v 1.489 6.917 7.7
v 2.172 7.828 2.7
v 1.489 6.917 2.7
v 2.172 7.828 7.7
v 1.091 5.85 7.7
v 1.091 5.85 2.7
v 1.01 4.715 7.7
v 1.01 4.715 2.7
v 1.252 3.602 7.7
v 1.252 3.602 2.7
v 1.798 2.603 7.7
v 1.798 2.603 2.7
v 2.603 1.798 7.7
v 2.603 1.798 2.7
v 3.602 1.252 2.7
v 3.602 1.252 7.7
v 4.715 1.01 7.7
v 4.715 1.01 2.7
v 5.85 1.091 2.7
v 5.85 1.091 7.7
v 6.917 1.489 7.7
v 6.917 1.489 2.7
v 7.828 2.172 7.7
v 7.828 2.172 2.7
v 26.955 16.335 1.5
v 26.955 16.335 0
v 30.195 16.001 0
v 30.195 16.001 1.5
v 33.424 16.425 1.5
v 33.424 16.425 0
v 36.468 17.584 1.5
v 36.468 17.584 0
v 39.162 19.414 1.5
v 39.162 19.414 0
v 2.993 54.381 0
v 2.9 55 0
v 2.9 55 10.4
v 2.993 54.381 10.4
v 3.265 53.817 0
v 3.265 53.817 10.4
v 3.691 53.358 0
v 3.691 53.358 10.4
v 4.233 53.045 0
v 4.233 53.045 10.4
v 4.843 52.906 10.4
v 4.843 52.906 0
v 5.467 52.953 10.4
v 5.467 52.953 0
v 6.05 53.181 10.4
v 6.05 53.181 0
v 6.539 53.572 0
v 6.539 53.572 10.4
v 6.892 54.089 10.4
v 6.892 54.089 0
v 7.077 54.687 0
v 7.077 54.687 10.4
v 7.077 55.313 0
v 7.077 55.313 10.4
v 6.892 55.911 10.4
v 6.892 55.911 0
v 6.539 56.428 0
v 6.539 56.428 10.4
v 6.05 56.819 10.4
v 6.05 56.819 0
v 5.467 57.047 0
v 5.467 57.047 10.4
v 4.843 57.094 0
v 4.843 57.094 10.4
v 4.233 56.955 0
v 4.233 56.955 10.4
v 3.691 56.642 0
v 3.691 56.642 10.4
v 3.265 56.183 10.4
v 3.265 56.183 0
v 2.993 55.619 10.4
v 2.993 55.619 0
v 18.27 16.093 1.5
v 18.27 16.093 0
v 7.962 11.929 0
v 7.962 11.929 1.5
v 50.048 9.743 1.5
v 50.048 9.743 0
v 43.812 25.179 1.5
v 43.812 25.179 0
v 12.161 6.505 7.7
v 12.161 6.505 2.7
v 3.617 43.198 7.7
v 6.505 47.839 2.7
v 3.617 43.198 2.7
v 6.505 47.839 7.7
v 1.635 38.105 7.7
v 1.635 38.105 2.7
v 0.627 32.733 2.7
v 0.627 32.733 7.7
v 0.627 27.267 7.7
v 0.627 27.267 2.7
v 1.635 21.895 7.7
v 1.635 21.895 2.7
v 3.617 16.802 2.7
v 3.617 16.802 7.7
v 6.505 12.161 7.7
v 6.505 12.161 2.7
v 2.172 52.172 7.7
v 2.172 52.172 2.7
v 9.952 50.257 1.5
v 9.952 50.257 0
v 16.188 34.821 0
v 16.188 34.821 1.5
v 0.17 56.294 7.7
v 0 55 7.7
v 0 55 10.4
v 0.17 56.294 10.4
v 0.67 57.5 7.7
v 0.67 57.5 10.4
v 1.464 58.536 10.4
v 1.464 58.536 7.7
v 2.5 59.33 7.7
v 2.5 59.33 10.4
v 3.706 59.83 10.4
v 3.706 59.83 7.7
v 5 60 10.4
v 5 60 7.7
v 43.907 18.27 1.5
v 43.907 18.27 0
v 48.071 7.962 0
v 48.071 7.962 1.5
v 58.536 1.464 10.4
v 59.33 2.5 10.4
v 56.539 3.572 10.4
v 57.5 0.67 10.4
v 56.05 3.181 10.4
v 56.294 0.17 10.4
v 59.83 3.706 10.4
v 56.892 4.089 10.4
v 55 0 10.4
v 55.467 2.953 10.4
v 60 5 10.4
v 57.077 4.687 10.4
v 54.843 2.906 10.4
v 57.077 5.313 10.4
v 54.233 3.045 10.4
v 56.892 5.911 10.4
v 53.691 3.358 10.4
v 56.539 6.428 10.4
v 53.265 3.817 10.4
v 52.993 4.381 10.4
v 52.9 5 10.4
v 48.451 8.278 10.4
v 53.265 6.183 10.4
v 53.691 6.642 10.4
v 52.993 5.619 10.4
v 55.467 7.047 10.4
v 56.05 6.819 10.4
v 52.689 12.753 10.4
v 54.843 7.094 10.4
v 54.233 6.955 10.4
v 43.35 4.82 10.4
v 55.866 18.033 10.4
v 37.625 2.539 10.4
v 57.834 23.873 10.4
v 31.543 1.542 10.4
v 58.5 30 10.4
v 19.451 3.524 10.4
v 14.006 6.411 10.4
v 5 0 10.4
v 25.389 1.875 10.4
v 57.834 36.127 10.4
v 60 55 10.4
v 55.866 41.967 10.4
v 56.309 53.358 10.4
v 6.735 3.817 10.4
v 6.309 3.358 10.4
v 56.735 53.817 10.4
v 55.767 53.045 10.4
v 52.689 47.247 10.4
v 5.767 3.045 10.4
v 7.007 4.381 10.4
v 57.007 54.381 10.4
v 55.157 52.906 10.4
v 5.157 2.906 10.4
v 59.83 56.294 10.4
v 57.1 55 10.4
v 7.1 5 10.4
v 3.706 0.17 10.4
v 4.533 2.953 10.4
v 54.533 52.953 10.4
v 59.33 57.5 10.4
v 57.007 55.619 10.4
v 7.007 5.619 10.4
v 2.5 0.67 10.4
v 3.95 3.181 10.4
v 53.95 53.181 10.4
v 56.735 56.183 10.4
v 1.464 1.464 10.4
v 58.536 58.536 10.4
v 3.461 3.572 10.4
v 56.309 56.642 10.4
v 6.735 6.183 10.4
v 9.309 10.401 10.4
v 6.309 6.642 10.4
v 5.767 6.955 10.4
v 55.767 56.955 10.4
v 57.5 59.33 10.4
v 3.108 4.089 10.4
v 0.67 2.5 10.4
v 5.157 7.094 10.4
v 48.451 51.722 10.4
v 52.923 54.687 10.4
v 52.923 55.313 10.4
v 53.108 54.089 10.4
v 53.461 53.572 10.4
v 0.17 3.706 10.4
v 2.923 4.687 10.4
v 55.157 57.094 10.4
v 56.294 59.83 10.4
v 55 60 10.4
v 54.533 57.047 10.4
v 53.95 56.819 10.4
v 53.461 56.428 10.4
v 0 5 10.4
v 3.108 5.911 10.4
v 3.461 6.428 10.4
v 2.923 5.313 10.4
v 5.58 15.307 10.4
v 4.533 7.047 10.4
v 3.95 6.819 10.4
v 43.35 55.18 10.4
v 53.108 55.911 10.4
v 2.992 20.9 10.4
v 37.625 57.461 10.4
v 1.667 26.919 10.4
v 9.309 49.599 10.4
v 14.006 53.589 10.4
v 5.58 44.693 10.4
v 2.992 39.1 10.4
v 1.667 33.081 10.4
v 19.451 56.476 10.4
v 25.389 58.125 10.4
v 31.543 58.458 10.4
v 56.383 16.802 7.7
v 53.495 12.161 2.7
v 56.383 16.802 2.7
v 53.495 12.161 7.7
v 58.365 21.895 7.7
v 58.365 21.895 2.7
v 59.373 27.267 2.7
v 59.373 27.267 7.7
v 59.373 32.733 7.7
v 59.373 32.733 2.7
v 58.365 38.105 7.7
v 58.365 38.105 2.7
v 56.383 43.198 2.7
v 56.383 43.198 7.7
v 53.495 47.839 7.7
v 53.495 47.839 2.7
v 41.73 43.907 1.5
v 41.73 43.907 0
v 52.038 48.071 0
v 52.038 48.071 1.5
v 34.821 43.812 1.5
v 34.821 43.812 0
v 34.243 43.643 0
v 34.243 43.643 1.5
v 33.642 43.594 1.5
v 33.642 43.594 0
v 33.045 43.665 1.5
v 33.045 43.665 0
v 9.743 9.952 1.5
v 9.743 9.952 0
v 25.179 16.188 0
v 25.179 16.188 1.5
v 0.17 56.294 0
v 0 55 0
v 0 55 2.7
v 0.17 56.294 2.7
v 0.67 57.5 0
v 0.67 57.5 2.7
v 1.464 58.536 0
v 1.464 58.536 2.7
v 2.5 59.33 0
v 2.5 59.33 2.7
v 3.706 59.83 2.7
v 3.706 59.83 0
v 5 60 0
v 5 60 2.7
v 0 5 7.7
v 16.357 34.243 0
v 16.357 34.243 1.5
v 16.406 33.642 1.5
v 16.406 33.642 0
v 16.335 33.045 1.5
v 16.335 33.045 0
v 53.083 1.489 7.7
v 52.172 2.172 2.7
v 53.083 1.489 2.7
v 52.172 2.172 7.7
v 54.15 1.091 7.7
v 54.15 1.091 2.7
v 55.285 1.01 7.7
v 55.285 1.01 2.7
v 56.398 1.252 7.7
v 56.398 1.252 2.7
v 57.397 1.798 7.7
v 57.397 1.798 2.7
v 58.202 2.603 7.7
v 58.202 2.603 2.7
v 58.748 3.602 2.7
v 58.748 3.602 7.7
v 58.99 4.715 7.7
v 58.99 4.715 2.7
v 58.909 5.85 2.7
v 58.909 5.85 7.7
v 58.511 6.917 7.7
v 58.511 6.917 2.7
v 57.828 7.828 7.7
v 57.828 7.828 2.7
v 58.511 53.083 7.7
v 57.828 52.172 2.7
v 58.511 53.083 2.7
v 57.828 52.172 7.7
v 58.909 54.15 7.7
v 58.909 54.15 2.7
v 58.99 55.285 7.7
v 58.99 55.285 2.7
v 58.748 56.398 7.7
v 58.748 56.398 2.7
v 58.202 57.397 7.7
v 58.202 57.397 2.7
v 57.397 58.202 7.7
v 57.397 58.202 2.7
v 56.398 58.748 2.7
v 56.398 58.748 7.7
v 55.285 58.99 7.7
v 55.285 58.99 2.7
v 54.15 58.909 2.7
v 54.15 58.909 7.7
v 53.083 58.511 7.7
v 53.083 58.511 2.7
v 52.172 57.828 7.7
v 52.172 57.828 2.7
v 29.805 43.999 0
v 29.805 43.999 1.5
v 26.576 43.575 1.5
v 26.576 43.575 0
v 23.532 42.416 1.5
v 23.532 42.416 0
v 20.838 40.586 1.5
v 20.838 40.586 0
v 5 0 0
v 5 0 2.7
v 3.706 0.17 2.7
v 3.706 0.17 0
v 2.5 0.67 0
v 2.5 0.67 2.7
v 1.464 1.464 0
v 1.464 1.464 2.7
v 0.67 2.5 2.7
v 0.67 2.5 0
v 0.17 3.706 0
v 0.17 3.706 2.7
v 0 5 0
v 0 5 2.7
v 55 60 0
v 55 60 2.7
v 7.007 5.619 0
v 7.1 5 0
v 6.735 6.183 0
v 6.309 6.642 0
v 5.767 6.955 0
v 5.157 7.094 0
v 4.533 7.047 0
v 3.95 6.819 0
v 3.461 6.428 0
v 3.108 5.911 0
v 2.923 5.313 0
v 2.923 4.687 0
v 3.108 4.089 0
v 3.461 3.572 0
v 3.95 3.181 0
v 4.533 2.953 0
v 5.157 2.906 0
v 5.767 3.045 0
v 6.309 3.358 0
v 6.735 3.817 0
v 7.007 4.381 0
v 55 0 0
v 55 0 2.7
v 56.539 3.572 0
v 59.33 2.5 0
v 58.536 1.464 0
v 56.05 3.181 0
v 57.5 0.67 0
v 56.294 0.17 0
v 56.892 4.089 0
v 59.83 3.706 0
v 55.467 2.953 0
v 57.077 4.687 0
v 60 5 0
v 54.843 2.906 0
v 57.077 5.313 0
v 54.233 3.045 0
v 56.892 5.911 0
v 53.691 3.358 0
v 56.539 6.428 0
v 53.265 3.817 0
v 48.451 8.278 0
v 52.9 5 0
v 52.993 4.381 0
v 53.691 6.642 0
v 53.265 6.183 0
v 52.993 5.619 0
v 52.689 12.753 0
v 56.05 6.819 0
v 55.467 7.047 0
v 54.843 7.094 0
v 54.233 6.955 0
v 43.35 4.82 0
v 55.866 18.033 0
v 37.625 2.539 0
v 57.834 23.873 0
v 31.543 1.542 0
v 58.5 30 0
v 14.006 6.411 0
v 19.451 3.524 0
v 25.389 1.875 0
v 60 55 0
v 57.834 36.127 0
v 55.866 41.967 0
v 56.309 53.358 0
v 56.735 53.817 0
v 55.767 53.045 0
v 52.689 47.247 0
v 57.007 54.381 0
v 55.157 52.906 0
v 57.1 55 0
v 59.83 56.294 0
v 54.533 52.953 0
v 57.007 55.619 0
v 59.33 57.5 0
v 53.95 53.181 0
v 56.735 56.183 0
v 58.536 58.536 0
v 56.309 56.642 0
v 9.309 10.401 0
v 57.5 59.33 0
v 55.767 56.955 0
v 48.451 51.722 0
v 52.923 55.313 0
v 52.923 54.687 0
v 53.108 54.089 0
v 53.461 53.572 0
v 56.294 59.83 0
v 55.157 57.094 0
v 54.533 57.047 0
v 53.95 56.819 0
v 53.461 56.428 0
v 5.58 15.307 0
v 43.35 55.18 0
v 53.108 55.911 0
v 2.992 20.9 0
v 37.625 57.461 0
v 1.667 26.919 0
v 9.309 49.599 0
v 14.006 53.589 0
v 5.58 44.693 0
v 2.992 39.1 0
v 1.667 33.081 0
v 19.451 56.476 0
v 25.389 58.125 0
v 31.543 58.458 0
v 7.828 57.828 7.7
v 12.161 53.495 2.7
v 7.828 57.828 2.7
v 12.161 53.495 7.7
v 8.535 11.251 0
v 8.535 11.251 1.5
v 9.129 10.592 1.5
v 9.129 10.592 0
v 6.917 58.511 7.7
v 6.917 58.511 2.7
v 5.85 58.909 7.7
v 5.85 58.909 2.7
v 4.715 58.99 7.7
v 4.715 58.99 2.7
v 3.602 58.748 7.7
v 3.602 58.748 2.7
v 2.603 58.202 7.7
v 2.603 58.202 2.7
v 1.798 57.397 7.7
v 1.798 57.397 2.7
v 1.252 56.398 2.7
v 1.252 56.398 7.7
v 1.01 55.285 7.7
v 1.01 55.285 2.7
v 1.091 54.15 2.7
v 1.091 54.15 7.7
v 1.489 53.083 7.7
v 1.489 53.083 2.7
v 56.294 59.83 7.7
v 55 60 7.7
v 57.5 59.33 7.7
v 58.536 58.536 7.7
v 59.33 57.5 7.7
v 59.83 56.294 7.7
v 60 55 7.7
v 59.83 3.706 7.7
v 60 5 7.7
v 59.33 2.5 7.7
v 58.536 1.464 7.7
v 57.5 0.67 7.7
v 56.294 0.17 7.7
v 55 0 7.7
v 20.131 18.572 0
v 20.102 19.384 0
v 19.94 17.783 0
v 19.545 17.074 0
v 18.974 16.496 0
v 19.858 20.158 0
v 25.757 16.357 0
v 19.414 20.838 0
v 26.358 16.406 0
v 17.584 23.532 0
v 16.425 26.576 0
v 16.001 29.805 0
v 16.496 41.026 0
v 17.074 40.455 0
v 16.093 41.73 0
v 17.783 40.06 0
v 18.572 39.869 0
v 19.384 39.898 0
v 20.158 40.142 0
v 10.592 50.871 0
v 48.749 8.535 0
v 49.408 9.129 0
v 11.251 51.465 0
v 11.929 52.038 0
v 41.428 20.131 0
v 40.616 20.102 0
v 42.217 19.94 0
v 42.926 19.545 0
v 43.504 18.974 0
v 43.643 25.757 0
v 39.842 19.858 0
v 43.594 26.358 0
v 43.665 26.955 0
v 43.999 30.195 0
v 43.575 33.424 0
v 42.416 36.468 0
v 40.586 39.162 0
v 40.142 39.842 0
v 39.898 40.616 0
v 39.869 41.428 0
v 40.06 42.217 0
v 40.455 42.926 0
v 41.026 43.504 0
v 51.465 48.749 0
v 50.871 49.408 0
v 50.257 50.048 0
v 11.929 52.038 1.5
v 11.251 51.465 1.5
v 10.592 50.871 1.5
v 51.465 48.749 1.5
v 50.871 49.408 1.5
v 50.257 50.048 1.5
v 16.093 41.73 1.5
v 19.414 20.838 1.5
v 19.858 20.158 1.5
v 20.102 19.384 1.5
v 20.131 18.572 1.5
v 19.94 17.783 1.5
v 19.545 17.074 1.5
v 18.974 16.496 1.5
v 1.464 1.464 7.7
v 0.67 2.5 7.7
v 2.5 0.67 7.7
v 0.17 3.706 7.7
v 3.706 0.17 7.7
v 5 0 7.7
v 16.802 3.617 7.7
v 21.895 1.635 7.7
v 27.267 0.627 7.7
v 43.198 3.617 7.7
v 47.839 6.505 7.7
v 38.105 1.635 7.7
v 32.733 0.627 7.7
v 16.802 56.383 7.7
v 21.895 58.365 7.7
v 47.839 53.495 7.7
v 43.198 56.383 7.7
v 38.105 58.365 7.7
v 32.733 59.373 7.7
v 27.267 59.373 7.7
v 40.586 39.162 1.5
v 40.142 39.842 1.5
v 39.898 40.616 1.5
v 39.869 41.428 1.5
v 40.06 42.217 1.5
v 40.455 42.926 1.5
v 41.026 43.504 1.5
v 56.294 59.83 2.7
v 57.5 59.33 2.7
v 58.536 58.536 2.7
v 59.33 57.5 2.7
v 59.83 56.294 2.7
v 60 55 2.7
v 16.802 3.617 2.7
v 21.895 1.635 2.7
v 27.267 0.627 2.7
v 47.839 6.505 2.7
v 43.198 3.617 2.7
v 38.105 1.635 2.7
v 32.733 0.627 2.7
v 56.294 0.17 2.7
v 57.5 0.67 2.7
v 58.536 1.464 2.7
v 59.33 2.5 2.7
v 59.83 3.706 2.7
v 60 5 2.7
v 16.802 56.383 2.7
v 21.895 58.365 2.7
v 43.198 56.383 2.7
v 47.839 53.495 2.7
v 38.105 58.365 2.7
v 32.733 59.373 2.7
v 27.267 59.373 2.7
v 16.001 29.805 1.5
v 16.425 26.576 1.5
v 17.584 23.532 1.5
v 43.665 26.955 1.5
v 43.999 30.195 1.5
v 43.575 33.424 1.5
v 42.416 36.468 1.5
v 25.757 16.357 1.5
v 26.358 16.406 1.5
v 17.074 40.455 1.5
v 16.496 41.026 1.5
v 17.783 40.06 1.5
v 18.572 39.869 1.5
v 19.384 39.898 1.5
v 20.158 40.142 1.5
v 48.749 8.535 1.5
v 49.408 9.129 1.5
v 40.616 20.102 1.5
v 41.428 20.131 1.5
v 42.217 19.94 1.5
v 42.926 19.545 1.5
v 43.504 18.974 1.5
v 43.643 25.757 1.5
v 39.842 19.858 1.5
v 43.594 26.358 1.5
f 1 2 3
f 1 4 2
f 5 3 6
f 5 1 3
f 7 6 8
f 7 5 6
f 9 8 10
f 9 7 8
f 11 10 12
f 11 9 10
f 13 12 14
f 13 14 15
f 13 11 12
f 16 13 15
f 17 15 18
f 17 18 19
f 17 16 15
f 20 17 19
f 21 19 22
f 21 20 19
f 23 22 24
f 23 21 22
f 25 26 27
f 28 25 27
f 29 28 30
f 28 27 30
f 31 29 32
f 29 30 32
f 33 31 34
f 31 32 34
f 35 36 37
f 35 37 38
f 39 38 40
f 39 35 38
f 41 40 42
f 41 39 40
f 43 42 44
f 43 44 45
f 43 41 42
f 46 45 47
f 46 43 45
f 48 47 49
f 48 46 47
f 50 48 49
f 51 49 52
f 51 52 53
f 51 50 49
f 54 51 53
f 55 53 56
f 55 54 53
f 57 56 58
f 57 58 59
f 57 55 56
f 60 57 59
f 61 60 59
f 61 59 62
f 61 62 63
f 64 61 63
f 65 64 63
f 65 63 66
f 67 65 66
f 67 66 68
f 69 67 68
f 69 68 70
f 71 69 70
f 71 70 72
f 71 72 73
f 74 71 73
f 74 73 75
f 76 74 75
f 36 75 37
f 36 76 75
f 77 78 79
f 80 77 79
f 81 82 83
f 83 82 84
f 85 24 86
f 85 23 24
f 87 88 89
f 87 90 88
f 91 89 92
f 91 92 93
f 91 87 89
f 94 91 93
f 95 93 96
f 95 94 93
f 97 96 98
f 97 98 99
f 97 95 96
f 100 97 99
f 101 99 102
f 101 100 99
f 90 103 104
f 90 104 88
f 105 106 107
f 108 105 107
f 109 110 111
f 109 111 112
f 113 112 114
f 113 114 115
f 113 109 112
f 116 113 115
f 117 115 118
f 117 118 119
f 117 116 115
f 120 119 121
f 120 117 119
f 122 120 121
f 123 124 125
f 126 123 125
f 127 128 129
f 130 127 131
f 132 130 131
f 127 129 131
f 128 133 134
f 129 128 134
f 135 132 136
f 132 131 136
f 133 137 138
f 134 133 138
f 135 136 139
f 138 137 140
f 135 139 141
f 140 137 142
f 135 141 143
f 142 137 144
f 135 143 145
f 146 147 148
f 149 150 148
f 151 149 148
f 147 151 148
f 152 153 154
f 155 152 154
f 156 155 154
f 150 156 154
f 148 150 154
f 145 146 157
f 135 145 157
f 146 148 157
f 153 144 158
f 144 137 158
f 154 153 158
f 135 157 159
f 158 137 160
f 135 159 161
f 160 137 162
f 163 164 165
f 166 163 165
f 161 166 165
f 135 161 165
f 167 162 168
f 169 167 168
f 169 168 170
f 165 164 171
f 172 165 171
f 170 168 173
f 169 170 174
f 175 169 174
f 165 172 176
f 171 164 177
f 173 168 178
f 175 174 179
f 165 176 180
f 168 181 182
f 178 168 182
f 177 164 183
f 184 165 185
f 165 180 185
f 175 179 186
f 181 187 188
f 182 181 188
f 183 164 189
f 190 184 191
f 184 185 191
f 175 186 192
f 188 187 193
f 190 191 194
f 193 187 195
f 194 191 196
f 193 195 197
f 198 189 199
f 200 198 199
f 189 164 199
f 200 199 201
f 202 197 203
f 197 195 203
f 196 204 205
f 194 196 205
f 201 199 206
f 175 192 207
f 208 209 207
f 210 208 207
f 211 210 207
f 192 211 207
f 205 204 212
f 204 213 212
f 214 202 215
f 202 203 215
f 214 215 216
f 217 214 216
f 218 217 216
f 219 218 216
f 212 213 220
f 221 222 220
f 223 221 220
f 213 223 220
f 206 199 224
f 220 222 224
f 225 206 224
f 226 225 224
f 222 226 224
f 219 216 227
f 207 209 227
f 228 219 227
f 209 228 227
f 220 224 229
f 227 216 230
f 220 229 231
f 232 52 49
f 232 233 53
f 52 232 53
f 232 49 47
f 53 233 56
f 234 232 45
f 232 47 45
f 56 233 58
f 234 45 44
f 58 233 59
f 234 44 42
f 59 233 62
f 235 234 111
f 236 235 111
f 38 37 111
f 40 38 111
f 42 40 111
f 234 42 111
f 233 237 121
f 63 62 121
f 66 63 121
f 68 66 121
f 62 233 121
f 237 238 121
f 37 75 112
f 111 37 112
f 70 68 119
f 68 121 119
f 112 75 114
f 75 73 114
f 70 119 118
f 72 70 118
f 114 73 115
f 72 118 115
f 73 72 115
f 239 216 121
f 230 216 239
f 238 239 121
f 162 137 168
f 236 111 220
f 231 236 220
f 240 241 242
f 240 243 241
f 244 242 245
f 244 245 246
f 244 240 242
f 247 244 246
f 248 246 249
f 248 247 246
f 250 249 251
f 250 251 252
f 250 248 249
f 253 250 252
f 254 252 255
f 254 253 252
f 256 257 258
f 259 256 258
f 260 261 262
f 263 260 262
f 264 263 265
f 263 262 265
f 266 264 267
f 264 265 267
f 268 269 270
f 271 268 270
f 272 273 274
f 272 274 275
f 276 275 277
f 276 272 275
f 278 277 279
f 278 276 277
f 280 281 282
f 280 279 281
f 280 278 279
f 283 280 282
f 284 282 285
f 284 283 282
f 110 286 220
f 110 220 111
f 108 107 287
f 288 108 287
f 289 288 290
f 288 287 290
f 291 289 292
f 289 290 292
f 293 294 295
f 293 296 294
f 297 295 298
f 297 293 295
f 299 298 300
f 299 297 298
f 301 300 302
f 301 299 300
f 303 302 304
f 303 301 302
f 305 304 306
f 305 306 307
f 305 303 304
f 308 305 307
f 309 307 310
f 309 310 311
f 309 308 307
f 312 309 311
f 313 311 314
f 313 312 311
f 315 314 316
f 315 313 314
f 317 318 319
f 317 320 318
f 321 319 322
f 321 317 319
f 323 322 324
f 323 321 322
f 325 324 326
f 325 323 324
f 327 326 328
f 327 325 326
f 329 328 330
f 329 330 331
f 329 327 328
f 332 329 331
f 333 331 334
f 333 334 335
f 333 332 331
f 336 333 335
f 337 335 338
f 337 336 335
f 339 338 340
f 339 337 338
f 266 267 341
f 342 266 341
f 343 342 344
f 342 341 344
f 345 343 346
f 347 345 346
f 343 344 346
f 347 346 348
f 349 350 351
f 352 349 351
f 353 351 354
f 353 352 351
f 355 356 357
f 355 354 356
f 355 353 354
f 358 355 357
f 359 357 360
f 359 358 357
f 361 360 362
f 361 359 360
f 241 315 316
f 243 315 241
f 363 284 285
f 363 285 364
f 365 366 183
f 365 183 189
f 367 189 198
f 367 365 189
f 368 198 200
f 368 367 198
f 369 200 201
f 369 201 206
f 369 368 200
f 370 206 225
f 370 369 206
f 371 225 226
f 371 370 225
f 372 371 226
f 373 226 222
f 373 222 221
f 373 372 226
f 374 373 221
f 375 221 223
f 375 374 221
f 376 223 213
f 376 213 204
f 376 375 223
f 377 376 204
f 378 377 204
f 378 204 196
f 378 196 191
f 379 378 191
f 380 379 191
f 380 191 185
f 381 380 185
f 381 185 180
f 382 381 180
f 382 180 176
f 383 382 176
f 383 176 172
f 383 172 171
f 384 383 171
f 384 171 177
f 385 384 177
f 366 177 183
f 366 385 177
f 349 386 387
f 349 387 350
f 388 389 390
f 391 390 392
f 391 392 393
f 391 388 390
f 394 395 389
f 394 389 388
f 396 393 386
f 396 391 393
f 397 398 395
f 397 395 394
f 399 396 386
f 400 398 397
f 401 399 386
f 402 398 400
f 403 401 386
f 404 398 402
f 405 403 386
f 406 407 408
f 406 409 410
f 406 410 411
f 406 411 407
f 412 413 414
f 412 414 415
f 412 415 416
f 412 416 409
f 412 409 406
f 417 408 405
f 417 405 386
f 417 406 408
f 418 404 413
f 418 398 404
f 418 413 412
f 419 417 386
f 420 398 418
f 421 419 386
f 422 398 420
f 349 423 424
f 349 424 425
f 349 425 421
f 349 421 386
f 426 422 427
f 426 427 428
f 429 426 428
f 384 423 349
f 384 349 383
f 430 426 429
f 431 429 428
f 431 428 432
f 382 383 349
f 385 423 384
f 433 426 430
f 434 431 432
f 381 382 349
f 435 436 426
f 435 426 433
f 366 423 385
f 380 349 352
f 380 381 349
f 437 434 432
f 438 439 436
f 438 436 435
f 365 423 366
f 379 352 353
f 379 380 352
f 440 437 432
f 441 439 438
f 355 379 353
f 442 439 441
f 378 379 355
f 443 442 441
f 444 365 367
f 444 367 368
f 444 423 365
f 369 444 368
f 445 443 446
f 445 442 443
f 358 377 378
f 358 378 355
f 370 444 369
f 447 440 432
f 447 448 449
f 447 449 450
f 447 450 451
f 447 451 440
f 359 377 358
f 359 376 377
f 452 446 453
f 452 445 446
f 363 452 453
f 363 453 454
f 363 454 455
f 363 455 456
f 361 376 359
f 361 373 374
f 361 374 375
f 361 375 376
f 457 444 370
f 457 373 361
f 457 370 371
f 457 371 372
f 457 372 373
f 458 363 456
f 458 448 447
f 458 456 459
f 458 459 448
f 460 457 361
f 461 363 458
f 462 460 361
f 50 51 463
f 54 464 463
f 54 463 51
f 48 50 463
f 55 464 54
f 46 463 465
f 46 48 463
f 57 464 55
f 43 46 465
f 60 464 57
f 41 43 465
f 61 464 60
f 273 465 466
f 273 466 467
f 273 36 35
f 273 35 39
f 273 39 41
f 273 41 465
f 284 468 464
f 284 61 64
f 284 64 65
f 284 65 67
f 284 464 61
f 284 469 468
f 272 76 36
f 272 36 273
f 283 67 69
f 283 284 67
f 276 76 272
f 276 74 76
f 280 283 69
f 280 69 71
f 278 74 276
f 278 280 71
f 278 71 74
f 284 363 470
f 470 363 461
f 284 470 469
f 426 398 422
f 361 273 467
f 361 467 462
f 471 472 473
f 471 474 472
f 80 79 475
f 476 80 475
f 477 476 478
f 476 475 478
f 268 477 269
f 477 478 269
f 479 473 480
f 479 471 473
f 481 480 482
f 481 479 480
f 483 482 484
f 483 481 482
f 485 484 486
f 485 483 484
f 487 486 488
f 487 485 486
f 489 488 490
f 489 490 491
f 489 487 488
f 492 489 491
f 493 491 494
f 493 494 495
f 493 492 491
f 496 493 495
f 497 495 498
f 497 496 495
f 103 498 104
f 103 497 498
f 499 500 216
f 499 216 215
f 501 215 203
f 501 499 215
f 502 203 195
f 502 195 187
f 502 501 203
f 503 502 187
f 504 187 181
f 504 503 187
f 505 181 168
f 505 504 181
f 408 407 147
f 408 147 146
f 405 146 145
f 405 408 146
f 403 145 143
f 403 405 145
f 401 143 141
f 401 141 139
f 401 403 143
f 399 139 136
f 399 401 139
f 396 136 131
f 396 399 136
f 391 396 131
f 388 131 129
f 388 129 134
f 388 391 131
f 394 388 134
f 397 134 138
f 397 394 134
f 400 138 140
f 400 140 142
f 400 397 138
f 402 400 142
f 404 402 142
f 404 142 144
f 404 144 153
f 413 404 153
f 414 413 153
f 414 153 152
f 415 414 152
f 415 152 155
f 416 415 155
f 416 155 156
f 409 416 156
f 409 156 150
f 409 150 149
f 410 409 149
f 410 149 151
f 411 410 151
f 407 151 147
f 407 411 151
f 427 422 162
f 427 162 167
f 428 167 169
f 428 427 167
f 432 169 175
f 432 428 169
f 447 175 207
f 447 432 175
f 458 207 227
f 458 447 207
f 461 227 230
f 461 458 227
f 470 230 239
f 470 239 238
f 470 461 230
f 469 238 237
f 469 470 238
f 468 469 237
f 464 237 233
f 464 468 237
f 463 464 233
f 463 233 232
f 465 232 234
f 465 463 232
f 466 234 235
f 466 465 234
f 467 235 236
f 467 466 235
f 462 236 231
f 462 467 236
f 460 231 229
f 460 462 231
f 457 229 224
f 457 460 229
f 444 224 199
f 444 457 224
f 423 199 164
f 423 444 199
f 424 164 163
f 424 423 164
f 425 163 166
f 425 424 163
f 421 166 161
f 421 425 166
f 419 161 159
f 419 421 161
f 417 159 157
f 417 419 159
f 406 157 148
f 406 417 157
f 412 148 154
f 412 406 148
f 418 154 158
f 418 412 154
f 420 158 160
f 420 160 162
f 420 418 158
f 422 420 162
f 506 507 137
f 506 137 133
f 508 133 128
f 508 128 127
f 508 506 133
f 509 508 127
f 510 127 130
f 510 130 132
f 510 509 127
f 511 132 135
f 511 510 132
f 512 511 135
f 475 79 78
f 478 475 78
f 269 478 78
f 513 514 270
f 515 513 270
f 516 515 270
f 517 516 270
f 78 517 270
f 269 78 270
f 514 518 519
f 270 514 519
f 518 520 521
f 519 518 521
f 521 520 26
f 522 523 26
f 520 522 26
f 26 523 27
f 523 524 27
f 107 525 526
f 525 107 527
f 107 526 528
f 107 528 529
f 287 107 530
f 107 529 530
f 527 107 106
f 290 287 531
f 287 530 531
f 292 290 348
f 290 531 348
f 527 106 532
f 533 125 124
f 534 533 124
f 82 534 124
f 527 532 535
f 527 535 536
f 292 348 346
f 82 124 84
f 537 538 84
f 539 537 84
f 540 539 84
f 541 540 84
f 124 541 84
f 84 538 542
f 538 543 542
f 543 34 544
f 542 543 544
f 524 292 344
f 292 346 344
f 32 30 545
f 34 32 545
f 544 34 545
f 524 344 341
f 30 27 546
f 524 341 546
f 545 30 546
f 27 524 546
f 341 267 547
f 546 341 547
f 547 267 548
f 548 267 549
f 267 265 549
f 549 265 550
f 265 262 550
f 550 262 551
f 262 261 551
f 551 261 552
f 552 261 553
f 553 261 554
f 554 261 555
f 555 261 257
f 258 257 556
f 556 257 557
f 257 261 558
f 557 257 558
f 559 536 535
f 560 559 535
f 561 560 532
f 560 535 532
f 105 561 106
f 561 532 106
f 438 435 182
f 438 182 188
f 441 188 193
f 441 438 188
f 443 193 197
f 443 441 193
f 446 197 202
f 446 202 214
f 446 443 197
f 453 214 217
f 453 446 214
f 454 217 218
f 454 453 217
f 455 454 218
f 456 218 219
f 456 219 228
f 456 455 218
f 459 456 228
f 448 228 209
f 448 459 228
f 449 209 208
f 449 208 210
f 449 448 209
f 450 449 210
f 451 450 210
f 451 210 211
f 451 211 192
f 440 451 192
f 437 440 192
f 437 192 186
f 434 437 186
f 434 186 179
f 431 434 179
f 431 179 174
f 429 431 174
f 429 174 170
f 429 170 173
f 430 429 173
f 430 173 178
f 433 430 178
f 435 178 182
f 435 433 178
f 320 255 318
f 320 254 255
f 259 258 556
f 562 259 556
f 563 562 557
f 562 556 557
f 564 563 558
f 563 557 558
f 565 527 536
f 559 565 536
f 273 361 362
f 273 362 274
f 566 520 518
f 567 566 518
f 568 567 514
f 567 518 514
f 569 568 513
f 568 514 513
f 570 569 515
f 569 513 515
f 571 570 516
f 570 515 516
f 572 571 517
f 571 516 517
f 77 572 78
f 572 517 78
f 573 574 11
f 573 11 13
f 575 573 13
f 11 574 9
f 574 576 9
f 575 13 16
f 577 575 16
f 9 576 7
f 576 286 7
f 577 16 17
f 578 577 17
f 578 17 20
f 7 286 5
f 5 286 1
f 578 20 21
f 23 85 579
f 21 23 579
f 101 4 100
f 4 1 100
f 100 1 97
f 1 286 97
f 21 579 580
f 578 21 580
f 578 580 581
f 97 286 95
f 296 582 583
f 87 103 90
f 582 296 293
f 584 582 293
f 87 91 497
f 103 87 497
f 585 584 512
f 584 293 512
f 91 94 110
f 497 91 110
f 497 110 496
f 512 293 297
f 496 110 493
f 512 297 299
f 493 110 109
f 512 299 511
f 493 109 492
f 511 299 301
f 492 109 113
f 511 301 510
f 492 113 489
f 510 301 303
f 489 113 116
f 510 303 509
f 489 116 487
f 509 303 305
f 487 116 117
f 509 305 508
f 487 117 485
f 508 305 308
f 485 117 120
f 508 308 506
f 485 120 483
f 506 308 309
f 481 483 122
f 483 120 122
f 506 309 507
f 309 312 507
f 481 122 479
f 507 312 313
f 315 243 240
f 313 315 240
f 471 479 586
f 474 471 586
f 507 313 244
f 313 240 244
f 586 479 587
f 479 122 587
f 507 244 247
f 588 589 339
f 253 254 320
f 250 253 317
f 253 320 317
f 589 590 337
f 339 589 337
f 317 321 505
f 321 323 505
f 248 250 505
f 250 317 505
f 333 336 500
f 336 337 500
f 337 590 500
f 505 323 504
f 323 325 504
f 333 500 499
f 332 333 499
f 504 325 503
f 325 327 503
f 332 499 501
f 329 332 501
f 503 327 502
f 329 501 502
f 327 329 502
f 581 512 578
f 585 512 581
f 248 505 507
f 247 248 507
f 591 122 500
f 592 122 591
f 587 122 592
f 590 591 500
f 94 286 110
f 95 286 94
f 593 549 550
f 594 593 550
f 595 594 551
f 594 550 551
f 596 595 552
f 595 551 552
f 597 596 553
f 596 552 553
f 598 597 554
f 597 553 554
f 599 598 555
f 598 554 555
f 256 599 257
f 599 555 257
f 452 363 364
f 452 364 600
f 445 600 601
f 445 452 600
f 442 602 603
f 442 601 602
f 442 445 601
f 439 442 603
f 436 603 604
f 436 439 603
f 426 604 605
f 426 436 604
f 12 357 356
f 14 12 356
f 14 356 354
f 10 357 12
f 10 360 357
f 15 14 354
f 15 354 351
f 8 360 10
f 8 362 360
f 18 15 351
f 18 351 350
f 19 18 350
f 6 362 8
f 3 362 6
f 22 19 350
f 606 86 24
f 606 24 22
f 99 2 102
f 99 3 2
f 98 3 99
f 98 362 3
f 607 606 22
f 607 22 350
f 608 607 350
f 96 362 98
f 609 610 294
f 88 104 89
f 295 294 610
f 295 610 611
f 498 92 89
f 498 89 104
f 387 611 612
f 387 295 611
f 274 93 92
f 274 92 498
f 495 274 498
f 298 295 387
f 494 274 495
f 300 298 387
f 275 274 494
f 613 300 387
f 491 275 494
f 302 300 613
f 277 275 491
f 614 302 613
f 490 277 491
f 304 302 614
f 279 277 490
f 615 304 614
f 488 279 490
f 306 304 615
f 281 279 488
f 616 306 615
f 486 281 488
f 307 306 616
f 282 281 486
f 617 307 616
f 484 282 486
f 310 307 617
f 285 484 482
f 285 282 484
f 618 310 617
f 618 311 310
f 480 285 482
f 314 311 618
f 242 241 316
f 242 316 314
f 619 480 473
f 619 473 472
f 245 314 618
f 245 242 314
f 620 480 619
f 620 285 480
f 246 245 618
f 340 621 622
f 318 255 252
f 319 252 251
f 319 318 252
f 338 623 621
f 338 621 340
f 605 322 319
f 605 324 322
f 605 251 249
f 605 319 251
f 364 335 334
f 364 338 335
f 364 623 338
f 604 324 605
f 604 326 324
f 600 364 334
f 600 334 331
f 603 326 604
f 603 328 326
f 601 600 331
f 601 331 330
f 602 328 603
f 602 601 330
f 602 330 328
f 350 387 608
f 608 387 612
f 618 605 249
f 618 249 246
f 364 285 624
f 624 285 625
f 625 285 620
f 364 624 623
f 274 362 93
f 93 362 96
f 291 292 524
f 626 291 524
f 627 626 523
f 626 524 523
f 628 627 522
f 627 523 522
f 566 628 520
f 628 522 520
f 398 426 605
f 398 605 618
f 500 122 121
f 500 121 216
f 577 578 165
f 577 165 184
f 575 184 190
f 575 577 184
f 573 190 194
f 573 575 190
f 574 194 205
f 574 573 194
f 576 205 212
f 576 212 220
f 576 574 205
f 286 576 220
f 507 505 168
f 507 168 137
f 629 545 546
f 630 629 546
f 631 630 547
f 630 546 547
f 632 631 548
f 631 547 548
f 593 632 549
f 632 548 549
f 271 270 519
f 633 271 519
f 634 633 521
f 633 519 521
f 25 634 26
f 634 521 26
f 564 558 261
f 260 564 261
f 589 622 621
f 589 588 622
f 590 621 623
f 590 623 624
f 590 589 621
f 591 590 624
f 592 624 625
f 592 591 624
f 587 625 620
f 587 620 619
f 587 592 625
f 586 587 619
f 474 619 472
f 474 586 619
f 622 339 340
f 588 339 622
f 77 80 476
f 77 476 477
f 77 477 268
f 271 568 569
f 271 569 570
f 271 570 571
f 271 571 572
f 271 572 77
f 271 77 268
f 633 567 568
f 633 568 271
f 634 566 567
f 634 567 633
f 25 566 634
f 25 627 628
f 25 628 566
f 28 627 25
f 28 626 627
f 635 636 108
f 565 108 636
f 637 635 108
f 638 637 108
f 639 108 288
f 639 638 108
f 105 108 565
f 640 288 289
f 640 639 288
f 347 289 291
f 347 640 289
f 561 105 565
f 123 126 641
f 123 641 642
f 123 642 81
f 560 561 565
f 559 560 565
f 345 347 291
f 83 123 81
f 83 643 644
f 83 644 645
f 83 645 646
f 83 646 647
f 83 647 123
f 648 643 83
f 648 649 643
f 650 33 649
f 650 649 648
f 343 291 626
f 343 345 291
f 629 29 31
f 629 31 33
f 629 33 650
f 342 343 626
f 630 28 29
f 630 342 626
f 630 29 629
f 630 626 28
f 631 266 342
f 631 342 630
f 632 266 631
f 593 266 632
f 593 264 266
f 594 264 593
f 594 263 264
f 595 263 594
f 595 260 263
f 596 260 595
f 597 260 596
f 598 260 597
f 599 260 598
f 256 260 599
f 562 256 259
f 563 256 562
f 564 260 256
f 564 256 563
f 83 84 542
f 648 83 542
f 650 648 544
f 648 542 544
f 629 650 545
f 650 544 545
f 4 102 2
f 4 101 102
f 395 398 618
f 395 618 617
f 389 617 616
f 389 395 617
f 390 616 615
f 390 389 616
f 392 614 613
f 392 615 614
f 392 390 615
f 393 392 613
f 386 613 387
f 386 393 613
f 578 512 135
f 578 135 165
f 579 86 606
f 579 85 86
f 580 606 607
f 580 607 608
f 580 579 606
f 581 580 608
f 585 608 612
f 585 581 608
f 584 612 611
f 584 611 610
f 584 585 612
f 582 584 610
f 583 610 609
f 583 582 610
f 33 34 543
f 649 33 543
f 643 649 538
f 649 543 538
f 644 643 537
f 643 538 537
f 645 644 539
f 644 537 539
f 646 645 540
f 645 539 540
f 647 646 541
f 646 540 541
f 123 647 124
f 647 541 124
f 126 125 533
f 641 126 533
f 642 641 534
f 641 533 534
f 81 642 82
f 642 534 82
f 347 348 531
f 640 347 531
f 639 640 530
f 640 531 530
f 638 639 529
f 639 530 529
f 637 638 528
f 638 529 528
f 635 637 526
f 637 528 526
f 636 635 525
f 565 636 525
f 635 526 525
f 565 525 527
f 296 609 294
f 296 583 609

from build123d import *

# Parameters (mm, degrees)
ESQUISSE1_R             = 28.5
ESQUISSE1_R_2           = 2.1
BOSS_EXTRU_1_DEPTH      = 10.4
ENL_V_MAT_EXTRU_1_DEPTH = 2.5
BOSS_EXTRU_2_DEPTH      = 1.5


with BuildPart() as part:
    # Esquisse1 → Boss.-Extru.1 (new body)
    with BuildSketch(Plane.XY):
        with BuildLine():
            Line((5, 60), (55, 60))
            ThreePointArc((55, 60), (58.535533906, 58.535533906), (60, 55))
            Line((60, 55), (60, 5))
            ThreePointArc((60, 5), (58.535533906, 1.464466094), (55, 0))
            Line((55, 0), (5, 0))
            ThreePointArc((5, 0), (1.464466094, 1.464466094), (0, 5))
            Line((0, 5), (0, 55))
            ThreePointArc((0, 55), (1.464466094, 58.535533906), (5, 60))
        make_face()
        with Locations((30, 30)):
            Circle(ESQUISSE1_R, mode=Mode.SUBTRACT)
        with Locations((55, 55)):
            Circle(ESQUISSE1_R_2, mode=Mode.SUBTRACT)
        with Locations(Location((5, 55, 0), (0, 0, 180))):
            Circle(ESQUISSE1_R_2, mode=Mode.SUBTRACT)
        with Locations(Location((55, 5, 0), (0, 0, 180))):
            Circle(ESQUISSE1_R_2, mode=Mode.SUBTRACT)
        with Locations((5, 5)):
            Circle(ESQUISSE1_R_2, mode=Mode.SUBTRACT)
    extrude(amount=BOSS_EXTRU_1_DEPTH)

    # Esquisse2 → Enlèv. mat.-Extru.1 (cut, symmetric)
    with BuildSketch(Plane.XY.offset(5.2)):
        with BuildLine():
            Line((5, 0), (55, 0))
            ThreePointArc((55, 0), (58.535533906, 1.464466094), (60, 5))
            Line((60, 5), (60, 55))
            ThreePointArc((60, 55), (58.535533906, 58.535533906), (55, 60))
            Line((55, 60), (5, 60))
            ThreePointArc((5, 60), (1.464466094, 58.535533906), (0, 55))
            Line((0, 55), (0, 5))
            ThreePointArc((0, 5), (1.464466094, 1.464466094), (5, 0))
        make_face()
        with BuildLine():
            Line((2.171572875, 52.171572875), (6.50457019, 47.838575561))
            ThreePointArc((6.50457019, 47.838575561), (0.5, 30), (6.50457019, 12.161424439))
            Line((6.50457019, 12.161424439), (2.171572875, 7.828427125))
            ThreePointArc((2.171572875, 7.828427125), (2.171572875, 2.171572875), (7.828427125, 2.171572875))
            Line((7.828427125, 2.171572875), (12.161424439, 6.50457019))
            ThreePointArc((12.161424439, 6.50457019), (30, 0.5), (47.838575561, 6.50457019))
            Line((47.838575561, 6.50457019), (52.171572875, 2.171572875))
            ThreePointArc((52.171572875, 2.171572875), (57.828427125, 2.171572875), (57.828427125, 7.828427125))
            Line((57.828427125, 7.828427125), (53.49542981, 12.161424439))
            ThreePointArc((53.49542981, 12.161424439), (59.5, 30), (53.49542981, 47.838575561))
            Line((53.49542981, 47.838575561), (57.828427125, 52.171572875))
            ThreePointArc((57.828427125, 52.171572875), (57.828427125, 57.828427125), (52.171572875, 57.828427125))
            Line((52.171572875, 57.828427125), (47.838575561, 53.49542981))
            ThreePointArc((47.838575561, 53.49542981), (30, 59.5), (12.161424439, 53.49542981))
            Line((12.161424439, 53.49542981), (7.828427125, 57.828427125))
            ThreePointArc((7.828427125, 57.828427125), (2.171572875, 57.828427125), (2.171572875, 52.171572875))
        make_face(mode=Mode.SUBTRACT)
    extrude(amount=ENL_V_MAT_EXTRU_1_DEPTH, both=True, mode=Mode.SUBTRACT)


with BuildPart() as body_2:
    # Esquisse3 → Boss.-Extru.2 (new body)
    with BuildSketch(Plane(origin=(0, 0, 0), x_dir=(-1, 0, 0), z_dir=(0, 0, -1))):
        with BuildLine():
            Line((-43.906875019, 18.269747351), (-48.071463829, 7.962028336))
            ThreePointArc((-48.071463829, 7.962028336), (-49.08055505, 8.829680707), (-50.048041717, 9.743494297))
            Line((-50.048041717, 9.743494297), (-43.81159756, 25.179235243))
            ThreePointArc((-43.81159756, 25.179235243), (-43.603322258, 26.056204232), (-43.664946337, 26.955457078))
            ThreePointArc((-43.664946337, 26.955457078), (-43.574743293, 33.424375055), (-40.585706707, 39.162031081))
            ThreePointArc((-40.585706707, 39.162031081), (-39.937719121, 41.828802935), (-41.730252649, 43.906875019))
            Line((-41.730252649, 43.906875019), (-52.037971664, 48.071463829))
            ThreePointArc((-52.037971664, 48.071463829), (-51.170319293, 49.08055505), (-50.256505703, 50.048041717))
            Line((-50.256505703, 50.048041717), (-34.820764757, 43.81159756))
            ThreePointArc((-34.820764757, 43.81159756), (-33.943795768, 43.603322258), (-33.044542922, 43.664946337))
            ThreePointArc((-33.044542922, 43.664946337), (-26.575624945, 43.574743293), (-20.837968919, 40.585706707))
            ThreePointArc((-20.837968919, 40.585706707), (-18.171197065, 39.937719121), (-16.093124981, 41.730252649))
            Line((-16.093124981, 41.730252649), (-11.928536171, 52.037971664))
            ThreePointArc((-11.928536171, 52.037971664), (-10.91944495, 51.170319293), (-9.951958283, 50.256505703))
            Line((-9.951958283, 50.256505703), (-16.18840244, 34.820764757))
            ThreePointArc((-16.18840244, 34.820764757), (-16.396677742, 33.943795768), (-16.335053663, 33.044542922))
            ThreePointArc((-16.335053663, 33.044542922), (-16.425256707, 26.575624945), (-19.414293293, 20.837968919))
            ThreePointArc((-19.414293293, 20.837968919), (-20.062280879, 18.171197065), (-18.269747351, 16.093124981))
            Line((-18.269747351, 16.093124981), (-7.962028336, 11.928536171))
            ThreePointArc((-7.962028336, 11.928536171), (-8.829680707, 10.91944495), (-9.743494297, 9.951958283))
            Line((-9.743494297, 9.951958283), (-25.179235243, 16.18840244))
            ThreePointArc((-25.179235243, 16.18840244), (-26.056204232, 16.396677742), (-26.955457078, 16.335053663))
            ThreePointArc((-26.955457078, 16.335053663), (-33.424375055, 16.425256707), (-39.162031081, 19.414293293))
            ThreePointArc((-39.162031081, 19.414293293), (-41.828802935, 20.062280879), (-43.906875019, 18.269747351))
        make_face()
    extrude(amount=-BOSS_EXTRU_2_DEPTH)


solid = Compound([part.part, body_2.part])
